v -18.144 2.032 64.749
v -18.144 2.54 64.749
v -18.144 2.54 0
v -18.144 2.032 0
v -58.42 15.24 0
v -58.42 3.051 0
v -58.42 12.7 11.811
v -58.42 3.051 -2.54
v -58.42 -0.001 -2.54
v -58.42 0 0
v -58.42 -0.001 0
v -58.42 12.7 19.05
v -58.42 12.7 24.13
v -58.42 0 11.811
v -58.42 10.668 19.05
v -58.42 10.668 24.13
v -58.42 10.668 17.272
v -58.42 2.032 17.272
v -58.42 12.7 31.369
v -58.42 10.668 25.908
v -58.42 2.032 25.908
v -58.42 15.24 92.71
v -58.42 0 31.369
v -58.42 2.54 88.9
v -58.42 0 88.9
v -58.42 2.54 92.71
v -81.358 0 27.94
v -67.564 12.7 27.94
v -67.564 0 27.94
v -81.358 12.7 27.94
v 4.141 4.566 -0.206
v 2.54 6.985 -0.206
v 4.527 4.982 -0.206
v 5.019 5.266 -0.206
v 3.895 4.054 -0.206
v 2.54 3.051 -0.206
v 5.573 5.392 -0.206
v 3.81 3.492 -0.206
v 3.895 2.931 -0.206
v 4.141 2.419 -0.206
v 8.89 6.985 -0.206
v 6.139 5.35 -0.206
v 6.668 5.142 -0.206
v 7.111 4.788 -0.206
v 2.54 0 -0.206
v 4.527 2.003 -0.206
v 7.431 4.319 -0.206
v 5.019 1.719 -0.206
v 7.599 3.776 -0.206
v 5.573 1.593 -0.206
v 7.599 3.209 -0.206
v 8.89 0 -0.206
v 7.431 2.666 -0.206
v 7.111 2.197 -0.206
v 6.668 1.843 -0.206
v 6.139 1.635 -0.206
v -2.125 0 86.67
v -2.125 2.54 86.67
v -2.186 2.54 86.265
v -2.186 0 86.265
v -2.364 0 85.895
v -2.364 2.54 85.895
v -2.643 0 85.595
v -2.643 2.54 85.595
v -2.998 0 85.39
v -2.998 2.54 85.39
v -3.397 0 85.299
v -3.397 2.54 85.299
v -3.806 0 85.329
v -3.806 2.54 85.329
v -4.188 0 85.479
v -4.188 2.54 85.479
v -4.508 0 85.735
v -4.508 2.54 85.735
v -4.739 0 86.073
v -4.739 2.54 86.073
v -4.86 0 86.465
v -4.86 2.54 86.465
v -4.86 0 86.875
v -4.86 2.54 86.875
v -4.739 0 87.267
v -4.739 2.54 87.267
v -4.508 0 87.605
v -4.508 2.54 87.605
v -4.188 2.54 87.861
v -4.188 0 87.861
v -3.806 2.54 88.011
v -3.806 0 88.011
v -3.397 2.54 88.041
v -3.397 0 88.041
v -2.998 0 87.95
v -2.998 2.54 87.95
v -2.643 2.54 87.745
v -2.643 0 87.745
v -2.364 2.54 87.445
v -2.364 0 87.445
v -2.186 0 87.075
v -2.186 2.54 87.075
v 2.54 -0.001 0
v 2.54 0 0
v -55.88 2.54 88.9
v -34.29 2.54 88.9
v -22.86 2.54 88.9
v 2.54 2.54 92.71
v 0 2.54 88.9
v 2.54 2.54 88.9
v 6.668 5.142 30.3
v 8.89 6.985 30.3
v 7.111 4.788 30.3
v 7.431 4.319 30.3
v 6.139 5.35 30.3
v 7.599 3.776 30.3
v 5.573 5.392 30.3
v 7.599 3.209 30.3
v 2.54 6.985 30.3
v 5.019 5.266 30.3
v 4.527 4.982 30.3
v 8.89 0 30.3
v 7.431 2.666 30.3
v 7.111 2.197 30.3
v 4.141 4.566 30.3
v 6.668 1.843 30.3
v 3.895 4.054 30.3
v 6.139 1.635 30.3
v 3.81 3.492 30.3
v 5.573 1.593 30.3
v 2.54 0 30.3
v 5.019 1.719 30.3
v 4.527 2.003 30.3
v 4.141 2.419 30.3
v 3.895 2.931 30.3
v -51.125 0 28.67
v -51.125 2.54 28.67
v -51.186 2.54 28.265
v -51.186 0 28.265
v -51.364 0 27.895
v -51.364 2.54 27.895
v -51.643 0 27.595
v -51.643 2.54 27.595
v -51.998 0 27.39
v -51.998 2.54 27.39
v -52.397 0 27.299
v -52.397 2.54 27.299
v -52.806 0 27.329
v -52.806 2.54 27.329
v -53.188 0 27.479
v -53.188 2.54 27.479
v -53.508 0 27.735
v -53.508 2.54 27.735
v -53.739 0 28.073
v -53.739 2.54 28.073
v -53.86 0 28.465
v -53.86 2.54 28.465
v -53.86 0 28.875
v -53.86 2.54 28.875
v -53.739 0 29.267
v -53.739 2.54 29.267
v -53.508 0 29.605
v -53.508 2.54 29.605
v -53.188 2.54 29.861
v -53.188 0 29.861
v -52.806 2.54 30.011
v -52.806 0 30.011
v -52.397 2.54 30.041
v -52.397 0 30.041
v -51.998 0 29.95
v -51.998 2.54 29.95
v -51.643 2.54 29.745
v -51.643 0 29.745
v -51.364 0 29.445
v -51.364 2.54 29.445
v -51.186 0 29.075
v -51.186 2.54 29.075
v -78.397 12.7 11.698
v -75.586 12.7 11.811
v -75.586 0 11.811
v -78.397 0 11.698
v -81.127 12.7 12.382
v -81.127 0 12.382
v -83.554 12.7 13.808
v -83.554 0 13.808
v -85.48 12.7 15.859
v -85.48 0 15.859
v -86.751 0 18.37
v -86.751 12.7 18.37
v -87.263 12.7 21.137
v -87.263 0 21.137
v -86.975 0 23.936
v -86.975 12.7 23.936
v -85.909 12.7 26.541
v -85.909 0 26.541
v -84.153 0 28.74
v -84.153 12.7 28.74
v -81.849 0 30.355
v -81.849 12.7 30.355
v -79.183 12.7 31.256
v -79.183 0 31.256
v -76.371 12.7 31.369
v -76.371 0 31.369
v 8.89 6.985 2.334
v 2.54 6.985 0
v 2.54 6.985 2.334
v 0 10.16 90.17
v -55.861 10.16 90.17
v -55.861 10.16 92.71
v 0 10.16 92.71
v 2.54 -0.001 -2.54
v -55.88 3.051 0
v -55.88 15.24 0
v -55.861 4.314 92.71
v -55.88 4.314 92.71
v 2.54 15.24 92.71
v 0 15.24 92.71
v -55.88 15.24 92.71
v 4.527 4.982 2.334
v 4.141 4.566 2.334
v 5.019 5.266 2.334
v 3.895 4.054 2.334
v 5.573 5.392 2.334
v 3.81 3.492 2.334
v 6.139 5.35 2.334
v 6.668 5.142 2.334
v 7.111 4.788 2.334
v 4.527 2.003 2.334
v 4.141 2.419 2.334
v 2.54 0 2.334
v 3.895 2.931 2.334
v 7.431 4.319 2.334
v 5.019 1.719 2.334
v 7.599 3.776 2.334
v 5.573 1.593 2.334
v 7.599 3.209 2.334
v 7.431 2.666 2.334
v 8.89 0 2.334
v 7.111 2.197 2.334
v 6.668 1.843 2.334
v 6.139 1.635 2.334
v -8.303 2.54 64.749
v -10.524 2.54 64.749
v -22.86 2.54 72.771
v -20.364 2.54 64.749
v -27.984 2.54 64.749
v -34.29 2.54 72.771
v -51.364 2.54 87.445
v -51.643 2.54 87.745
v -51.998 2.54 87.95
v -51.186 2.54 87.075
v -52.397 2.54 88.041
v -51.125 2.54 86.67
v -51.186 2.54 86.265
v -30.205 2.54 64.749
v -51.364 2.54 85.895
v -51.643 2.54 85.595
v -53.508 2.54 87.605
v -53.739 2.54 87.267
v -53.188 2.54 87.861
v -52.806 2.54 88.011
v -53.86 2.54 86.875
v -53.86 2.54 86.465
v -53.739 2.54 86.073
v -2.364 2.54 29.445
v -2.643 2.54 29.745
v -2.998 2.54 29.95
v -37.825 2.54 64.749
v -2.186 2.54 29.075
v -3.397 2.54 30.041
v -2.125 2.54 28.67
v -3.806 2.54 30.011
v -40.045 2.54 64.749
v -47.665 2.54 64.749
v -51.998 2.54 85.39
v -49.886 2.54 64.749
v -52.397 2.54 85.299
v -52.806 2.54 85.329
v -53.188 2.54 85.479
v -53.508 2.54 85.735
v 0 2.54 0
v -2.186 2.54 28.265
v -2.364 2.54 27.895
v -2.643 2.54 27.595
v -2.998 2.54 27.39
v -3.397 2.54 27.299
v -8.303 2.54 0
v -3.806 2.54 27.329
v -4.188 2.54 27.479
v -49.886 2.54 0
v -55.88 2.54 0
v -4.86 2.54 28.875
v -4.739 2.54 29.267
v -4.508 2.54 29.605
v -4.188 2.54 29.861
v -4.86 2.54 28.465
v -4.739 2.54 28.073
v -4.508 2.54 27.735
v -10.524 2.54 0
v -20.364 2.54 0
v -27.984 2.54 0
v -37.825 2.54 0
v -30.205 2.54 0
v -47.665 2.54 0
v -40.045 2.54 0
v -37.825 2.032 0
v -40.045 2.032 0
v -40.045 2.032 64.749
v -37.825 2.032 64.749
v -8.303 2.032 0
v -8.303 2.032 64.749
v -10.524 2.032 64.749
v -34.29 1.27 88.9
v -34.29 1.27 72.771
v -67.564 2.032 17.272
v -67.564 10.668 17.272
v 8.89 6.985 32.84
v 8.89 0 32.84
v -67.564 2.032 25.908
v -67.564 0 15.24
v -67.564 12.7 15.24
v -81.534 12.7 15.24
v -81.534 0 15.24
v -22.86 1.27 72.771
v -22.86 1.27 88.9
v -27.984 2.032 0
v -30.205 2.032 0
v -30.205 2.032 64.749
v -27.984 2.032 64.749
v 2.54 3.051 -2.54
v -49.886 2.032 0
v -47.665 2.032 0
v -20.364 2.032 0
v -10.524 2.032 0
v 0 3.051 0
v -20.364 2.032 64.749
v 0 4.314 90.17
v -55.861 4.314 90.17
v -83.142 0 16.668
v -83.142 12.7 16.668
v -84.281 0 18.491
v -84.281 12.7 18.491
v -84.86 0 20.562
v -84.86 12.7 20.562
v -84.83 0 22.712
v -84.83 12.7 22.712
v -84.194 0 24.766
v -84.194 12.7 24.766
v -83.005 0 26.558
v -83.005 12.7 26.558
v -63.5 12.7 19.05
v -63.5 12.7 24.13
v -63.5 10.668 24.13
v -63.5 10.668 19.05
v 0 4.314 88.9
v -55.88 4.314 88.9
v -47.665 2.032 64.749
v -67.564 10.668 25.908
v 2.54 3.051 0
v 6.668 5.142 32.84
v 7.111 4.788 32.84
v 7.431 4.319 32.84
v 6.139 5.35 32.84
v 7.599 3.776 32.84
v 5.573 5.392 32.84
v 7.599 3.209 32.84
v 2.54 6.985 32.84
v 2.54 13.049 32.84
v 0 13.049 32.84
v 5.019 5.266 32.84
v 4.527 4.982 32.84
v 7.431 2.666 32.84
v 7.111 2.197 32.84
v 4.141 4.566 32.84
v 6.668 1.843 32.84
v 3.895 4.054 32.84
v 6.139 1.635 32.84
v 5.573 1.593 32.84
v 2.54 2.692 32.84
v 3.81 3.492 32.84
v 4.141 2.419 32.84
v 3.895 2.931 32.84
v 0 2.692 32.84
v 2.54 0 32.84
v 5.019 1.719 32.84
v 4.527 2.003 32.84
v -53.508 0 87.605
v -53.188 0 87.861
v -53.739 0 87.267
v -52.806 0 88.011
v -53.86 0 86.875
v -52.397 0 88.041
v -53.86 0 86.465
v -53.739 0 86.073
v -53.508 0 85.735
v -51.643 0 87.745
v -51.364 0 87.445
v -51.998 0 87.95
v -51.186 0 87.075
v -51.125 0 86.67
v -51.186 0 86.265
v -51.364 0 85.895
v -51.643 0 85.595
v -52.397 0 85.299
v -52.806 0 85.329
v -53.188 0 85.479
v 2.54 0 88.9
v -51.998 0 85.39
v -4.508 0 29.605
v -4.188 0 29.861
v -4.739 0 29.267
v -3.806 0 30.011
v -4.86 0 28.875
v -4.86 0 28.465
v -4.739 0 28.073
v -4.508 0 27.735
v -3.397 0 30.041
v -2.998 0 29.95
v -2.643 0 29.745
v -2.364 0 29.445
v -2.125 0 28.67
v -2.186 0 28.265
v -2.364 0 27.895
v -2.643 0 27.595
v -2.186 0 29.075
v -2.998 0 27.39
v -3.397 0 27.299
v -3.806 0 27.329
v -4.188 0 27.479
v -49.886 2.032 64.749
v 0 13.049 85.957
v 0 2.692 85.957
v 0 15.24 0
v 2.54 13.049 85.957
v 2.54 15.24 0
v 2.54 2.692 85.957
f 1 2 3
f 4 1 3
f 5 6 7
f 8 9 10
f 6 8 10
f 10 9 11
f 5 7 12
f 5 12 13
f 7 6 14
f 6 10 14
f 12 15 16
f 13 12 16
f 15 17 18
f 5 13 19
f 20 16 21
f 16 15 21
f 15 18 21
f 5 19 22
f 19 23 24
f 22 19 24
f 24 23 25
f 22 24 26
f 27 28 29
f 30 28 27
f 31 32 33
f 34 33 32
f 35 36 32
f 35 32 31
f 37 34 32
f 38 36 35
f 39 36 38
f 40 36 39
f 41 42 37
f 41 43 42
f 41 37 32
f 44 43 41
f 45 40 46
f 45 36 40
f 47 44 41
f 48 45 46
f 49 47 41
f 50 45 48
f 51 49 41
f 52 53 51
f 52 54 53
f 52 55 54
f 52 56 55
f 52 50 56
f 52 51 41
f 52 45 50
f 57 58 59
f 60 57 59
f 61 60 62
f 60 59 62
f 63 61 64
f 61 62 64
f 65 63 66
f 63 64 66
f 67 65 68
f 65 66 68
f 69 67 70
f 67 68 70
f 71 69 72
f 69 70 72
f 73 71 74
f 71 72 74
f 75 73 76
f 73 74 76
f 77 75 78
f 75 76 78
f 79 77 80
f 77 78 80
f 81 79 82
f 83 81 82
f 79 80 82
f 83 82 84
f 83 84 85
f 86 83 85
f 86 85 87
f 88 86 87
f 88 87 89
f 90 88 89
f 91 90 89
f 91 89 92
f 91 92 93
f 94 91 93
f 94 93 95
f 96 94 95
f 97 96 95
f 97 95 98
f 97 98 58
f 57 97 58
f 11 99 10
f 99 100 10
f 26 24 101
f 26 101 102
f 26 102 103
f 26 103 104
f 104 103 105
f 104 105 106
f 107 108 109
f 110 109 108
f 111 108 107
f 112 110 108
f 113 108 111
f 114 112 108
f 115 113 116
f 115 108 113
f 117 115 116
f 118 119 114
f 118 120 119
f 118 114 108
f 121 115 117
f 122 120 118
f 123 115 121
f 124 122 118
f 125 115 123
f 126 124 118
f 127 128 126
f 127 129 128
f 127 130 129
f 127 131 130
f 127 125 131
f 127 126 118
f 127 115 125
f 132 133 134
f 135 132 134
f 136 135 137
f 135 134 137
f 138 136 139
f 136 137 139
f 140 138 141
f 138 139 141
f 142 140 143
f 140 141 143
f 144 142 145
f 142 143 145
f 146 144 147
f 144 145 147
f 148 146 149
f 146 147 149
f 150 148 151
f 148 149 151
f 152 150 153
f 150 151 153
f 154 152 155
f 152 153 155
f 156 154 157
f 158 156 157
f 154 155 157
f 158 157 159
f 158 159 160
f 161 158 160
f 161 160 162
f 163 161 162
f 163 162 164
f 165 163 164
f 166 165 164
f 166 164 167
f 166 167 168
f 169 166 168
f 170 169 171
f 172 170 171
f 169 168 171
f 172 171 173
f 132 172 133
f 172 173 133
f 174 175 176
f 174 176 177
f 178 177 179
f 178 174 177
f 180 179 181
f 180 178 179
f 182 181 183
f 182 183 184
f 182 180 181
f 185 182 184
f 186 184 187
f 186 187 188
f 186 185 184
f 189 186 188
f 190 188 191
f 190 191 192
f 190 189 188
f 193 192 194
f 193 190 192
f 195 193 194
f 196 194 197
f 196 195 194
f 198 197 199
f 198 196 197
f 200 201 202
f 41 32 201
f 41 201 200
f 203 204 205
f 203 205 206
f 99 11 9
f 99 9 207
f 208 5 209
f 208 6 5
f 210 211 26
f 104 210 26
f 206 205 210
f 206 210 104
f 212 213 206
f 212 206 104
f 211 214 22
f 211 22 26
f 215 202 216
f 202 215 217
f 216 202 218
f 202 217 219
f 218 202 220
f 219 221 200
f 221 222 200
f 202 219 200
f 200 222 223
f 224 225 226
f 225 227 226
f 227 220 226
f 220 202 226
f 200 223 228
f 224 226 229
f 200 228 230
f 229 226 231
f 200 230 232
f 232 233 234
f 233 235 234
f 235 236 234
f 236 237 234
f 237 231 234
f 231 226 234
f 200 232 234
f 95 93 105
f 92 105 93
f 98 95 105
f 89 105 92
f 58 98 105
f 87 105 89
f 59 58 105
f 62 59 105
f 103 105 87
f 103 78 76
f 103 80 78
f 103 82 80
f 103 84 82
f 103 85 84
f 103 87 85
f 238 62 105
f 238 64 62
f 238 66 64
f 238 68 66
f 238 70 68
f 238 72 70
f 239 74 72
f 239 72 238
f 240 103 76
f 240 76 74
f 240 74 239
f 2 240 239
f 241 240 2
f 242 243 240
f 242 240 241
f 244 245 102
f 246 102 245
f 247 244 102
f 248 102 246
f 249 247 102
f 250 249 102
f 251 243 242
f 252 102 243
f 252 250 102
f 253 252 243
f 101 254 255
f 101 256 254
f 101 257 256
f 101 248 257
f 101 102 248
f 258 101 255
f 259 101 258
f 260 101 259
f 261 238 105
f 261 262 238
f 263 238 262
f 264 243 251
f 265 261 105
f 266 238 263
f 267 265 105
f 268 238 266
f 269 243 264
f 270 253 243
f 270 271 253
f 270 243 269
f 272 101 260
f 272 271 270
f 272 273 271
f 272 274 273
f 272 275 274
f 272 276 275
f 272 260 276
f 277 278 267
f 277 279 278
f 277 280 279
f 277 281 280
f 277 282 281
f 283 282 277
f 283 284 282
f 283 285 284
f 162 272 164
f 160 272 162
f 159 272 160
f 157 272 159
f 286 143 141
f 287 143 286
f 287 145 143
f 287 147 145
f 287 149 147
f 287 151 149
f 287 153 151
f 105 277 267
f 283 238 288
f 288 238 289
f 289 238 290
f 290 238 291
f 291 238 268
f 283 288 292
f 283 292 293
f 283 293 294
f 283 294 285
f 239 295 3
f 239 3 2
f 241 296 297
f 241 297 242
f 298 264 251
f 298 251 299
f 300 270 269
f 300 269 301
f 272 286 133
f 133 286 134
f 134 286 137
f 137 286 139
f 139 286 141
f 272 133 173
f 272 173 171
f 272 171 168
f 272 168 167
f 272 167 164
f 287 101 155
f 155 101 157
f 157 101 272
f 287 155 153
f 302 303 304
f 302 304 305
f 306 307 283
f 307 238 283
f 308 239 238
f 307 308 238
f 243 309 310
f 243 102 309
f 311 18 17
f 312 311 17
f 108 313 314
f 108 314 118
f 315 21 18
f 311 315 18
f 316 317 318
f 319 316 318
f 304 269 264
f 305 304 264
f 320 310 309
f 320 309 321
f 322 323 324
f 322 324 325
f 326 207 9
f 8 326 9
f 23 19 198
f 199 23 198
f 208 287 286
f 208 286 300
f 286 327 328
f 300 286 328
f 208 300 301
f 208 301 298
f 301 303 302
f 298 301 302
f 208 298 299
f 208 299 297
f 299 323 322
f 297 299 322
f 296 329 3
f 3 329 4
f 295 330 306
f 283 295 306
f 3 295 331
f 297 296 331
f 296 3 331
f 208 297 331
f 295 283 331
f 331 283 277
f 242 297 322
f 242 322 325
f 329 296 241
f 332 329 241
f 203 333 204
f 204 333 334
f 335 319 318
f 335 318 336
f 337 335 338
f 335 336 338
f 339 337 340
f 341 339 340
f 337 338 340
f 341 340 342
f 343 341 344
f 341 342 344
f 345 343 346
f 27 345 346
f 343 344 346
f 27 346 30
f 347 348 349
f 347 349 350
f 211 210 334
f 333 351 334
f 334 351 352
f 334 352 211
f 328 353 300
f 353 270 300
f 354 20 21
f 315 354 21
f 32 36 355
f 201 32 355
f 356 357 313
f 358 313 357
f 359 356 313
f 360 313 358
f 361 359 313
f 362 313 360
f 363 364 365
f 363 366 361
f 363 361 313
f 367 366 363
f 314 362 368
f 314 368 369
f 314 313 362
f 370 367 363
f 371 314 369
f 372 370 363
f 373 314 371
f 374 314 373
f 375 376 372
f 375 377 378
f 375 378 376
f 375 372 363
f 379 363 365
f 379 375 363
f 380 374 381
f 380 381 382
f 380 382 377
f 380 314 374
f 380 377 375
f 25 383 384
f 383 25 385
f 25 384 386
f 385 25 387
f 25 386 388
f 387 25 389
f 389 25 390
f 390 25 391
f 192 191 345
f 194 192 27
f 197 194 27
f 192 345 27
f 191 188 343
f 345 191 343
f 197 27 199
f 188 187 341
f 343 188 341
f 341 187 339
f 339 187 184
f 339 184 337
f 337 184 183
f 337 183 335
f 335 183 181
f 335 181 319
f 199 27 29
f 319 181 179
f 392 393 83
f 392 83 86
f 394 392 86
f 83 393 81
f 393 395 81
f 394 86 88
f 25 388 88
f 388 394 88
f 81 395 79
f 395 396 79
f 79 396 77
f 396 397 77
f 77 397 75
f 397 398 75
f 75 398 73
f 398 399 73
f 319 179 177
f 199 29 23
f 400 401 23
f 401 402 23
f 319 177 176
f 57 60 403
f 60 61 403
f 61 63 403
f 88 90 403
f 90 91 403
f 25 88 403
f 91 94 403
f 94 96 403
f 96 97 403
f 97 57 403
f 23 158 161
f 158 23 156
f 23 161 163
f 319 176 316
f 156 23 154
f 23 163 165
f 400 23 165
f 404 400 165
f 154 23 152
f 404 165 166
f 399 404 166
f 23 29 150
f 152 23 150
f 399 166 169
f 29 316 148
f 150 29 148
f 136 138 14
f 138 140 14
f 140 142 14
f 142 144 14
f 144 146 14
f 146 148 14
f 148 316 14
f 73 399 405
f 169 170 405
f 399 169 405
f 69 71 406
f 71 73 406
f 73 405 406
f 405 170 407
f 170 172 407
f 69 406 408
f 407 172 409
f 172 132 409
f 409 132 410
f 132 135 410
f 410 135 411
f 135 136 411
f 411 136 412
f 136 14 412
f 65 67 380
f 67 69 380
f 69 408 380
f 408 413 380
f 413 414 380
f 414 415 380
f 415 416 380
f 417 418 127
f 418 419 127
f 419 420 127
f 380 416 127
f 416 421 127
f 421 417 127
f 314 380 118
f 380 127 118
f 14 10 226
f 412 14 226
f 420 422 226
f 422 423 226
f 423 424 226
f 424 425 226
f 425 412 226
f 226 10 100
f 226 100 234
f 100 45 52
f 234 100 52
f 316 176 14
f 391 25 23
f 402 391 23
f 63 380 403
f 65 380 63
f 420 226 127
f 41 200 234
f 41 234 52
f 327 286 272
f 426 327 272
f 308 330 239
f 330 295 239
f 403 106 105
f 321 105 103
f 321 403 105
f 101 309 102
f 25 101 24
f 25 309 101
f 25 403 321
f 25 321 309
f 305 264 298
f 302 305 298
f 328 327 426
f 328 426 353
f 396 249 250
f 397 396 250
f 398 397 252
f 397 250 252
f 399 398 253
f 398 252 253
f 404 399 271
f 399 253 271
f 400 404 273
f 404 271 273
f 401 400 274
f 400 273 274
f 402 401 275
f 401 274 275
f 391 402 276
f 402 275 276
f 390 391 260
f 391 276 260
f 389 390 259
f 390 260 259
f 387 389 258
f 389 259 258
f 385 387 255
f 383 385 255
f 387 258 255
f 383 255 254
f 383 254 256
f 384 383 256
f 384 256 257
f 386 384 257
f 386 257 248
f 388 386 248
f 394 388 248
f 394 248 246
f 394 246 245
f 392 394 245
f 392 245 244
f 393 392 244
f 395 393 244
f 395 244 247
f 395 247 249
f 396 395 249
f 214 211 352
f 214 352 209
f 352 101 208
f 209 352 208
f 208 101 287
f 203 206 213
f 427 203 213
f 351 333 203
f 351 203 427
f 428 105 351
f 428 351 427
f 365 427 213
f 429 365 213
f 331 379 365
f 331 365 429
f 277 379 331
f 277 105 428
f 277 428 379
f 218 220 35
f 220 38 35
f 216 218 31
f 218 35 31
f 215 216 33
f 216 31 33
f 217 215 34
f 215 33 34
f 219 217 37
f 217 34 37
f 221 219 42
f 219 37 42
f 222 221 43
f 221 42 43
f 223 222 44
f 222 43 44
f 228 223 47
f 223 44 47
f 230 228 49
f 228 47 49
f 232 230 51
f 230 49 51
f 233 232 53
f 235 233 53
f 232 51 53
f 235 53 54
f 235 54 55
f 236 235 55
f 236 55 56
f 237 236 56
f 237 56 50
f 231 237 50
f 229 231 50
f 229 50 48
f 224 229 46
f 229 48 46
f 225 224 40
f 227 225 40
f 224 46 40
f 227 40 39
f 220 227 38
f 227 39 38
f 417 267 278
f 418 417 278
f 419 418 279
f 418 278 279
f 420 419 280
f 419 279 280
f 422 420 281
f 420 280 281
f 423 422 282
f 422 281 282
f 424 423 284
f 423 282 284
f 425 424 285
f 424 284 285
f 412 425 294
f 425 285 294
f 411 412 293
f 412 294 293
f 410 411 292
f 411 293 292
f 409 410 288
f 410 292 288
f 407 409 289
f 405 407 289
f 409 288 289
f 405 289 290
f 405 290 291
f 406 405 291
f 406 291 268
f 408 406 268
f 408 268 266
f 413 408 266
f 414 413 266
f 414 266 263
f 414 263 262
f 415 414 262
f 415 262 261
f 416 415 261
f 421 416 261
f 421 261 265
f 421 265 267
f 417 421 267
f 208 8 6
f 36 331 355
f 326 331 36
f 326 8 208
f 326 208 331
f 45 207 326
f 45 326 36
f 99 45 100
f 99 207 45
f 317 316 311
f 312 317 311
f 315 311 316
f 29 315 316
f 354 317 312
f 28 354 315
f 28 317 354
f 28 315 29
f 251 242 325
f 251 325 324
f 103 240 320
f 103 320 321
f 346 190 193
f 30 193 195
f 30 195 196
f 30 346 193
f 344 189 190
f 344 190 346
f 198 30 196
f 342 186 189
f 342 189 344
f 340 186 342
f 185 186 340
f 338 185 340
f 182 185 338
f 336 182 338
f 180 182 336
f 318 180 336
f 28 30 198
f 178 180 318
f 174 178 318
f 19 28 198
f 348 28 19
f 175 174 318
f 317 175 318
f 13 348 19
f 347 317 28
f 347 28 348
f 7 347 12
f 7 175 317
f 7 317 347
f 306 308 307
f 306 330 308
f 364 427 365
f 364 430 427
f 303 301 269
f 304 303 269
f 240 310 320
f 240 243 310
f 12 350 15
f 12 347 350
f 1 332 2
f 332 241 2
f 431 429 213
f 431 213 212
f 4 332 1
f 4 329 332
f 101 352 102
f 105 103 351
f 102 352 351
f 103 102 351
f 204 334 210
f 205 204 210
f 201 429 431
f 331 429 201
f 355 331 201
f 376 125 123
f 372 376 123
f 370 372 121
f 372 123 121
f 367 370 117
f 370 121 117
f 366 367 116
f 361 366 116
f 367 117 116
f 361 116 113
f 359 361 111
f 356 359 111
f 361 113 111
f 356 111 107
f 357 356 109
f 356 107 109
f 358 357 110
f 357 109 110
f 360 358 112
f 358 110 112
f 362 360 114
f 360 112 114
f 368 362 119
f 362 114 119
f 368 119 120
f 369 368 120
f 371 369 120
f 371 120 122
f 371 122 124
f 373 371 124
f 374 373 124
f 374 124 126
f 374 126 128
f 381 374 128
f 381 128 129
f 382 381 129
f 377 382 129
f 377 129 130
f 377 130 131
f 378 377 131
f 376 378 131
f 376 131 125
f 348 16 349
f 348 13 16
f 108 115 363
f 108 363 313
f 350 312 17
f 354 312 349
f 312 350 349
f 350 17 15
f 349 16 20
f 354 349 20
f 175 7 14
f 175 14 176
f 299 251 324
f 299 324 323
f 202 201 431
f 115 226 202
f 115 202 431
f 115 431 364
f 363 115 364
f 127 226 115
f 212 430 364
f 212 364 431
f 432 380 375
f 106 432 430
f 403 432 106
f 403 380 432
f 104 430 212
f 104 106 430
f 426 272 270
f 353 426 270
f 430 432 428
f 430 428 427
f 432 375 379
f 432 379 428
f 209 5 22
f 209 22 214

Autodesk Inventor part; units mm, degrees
ref_plane "YZ Plane" through (0, 0, 0) normal (1, 0, 0) x (0, 1, 0)
ref_plane "XZ Plane" through (0, 0, 0) normal (0, 1, 0) x (-1, 0, 0)
ref_plane "XY Plane" through (0, 0, 0) normal (0, 0, 1) x (1, 0, 0)
sketch "Sketch1" plane through (0, 0, 0) normal (0, 1, 0) x (-1, 0, 0)
  line L0 (0, 0) -> (55.88, 0)
  line L1 (55.88, 0) -> (55.88, 88.9)
  line L2 (55.88, 88.9) -> (0, 88.9)
  line L3 (0, 88.9) -> (0, 0)
  dimension "d0" = 55.88
  dimension "d1" = 88.9
extrude "Extrusion1" add sketch "Sketch1" along normal blind 2.54
sketch "Sketch2" plane through (0, 2.54, 0) normal (0, 1, 0) x (1, 0, 0)
  line L0 (-55.88, -88.9) -> (0, -88.9) projected
  line L1 (-22.86, -88.9) -> (-34.29, -88.9)
  line L2 (-34.29, -88.9) -> (-34.29, -72.771)
  line L3 (-34.29, -72.771) -> (-22.86, -72.771)
  line L4 (-22.86, -72.771) -> (-22.86, -88.9)
  point P0 (0, 0)
  dimension "d4" = 11.43
  dimension "d5" = 16.129
  dimension "d6" = 21.59
  dimension "d7" = 22.86
extrude "Extrusion2" cut sketch "Sketch2" against normal blind 1.27
sketch "Sketch3" plane through (0, 2.54, 0) normal (0, 1, 0) x (1, 0, 0)
  line L0 (-10.5239, -64.7488) -> (-8.3034, -64.7488)
  line L1 (-8.3034, -64.7488) -> (-8.3034, 0)
  line L2 (-8.3034, 0) -> (-10.5239, 0)
  line L3 (-10.5239, 0) -> (-10.5239, -64.7488)
  line L4 (0, 0) -> (-55.88, 0) projected
  line L5 (-27.9843, -64.7488) -> (-30.2048, -64.7488)
  line L6 (-30.2048, -64.7488) -> (-30.2048, 0)
  line L7 (-30.2048, 0) -> (-27.9843, 0)
  line L8 (-27.9843, 0) -> (-27.9843, -64.7488)
  line L9 (-49.8857, -64.7488) -> (-47.6652, -64.7488)
  line L10 (-47.6652, -64.7488) -> (-47.6652, 0)
  line L11 (-47.6652, 0) -> (-49.8857, 0)
  line L12 (-49.8857, 0) -> (-49.8857, -64.7488)
  line L13 (-40.0452, -64.7488) -> (-37.8248, -64.7488)
  line L14 (-37.8248, -64.7488) -> (-37.8248, 0)
  line L15 (-37.8248, 0) -> (-40.0452, 0)
  line L16 (-40.0452, 0) -> (-40.0452, -64.7488)
  line L17 (-20.3643, -64.7488) -> (-18.1439, -64.7488)
  line L18 (-18.1439, -64.7488) -> (-18.1439, 0)
  line L19 (-18.1439, 0) -> (-20.3643, 0)
  line L20 (-20.3643, 0) -> (-20.3643, -64.7488)
  line L21 (-47.6652, -64.7488) -> (-40.0452, -64.7488)
  line L22 (-34.29, -72.771) -> (-22.86, -72.771) projected
  line L23 (-37.8248, -64.7488) -> (-30.2048, -64.7488)
  line L24 (-27.9843, -64.7488) -> (-20.3643, -64.7488)
  line L25 (-18.1439, -64.7488) -> (-10.5239, -64.7488)
  dimension "d10" = 7.62
extrude "Extrusion3" cut sketch "Sketch3" against normal blind 0.508 contours L3 L2 L1 L0 | L17 L20 L4 L18 | L5 L6 L4 L8 | L13 L16 L4 L14 | L9 L12 L4 L10
sketch "Sketch4" plane through (-55.88, 0, 0) normal (-1, 0, 0) x (0, 0, 1)
  line L0 (88.9, 0) -> (0, 0) projected
  line L1 (88.9, 0) -> (0, 0)
  line L2 (0, 0) -> (0, 2.54)
  line L3 (0, 2.54) -> (88.9, 2.54)
  line L4 (88.9, 2.54) -> (88.9, 0)
extrude "Extrusion4" add sketch "Sketch4" along normal blind 2.54
sketch "Sketch5" plane through (0, 2.54, 0) normal (0, 1, 0) x (1, 0, 0)
  line L0 (0, -88.9) -> (-58.42, -88.9) projected
  line L1 (-49.8857, 0) -> (-58.42, 0) projected
  line L2 (-58.42, -88.9) -> (-55.88, -88.9)
  line L3 (-55.88, -88.9) -> (-55.88, 0)
  line L4 (-55.88, 0) -> (-58.42, 0)
  line L5 (-58.42, 0) -> (-58.42, -88.9)
  point P0 (0, 0)
  dimension "d15" = 2.54
extrude "Extrusion5" add sketch "Sketch5" along normal blind 12.7
sketch "Sketch6" plane through (0, 0, 88.9) normal (1, 0, 0) x (0, 0, -1)
  line L0 (0, 2.54) -> (16.129, 2.54) projected
  line L1 (0, 0) -> (88.9, 0) projected
  line L2 (0, 2.54) -> (88.9, 2.54)
  line L3 (88.9, 2.54) -> (88.9, 0)
  line L4 (88.9, 0) -> (0, 0)
  line L5 (0, 0) -> (0, 2.54)
extrude "Extrusion6" add sketch "Sketch6" along normal blind 2.54
sketch "Sketch7" plane through (0, 2.54, 0) normal (0, 1, 0) x (1, 0, 0)
  line L0 (2.54, 0) -> (2.54, -88.9) projected
  line L1 (2.54, -88.9) -> (0, -88.9)
  line L2 (0, -88.9) -> (0, 0)
  line L3 (0, 0) -> (2.54, 0)
  line L4 (2.54, 0) -> (2.54, -88.9)
extrude "Extrusion7" add sketch "Sketch7" along normal blind 12.7
sketch "Sketch8" plane through (-34.29, 1.27, 88.9) normal (0, 0, 1) x (1, 0, 0)
  line L0 (-24.13, -1.27) -> (-24.13, 13.97) projected
  line L1 (-21.59, 1.27) -> (-21.59, 13.97) projected
  line L2 (-24.13, 13.97) -> (-21.59, 13.97)
  line L3 (-21.59, 13.97) -> (-21.59, 1.27)
  line L4 (-21.59, 1.27) -> (-24.13, 1.27)
  line L5 (-24.13, 1.27) -> (-24.13, 13.97)
  line L6 (-24.13, 1.27) -> (36.83, 1.27)
  line L7 (36.83, 1.27) -> (36.83, 3.0441)
  line L8 (36.83, 3.0441) -> (-24.13, 3.0441)
  line L9 (-24.13, 3.0441) -> (-24.13, 1.27)
  line L10 (36.83, -1.27) -> (36.83, 13.97) projected
  line L11 (34.29, 1.27) -> (36.83, 1.27)
  line L12 (36.83, 1.27) -> (36.83, 13.97)
  line L13 (36.83, 13.97) -> (34.29, 13.97)
  line L14 (34.29, 13.97) -> (34.29, 1.27)
  line L15 (13.9257, 1.27) -> (6.3057, 1.27) projected
  line L16 (11.43, 0) -> (0, 0) projected
  line L17 (11.3074, 1.27) -> (0, 1.27)
  line L18 (0, 1.27) -> (0, 0)
  line L19 (0, 0) -> (11.3074, 0)
  line L20 (11.3074, 0) -> (11.3074, 1.27)
  point P0 (34.29, -1.27)
extrude "Extrusion8" add sketch "Sketch8" along normal blind 3.81 contours L0 L8 L1 L4 | L0 L2 L1 L8 | L1 L8 L14 L6 | L14 L13 L10 L8 | L8 L7 L6 L14
sketch "Sketch9" plane through (0, 2.54, 0) normal (0, 1, 0) x (1, 0, 0)
  line L0 (0, -92.71) -> (-55.88, -92.71) projected
  line L1 (-55.8607, -92.71) -> (0, -92.71)
  line L2 (0, -92.71) -> (0, -90.17)
  line L3 (0, -90.17) -> (-55.8607, -90.17)
  line L4 (-55.8607, -90.17) -> (-55.8607, -92.71)
  point P0 (0, 0)
  point P1 (-58.42, -92.71)
  point P2 (2.54, -92.71)
  dimension "d24" = 2.54
extrude "Extrusion9" add sketch "Sketch9" along normal blind 7.62
sketch "Sketch10" plane through (-20.3643, 2.54, 0) normal (0, 0, -1) x (-1, 0, 0)
  line L0 (-22.9043, 0) -> (-22.9043, 12.7) projected
  line L1 (38.0557, -2.54) -> (38.0557, 12.7) projected
  line L2 (-22.9043, -3.3059) -> (38.0557, -3.3059)
  line L3 (38.0557, -3.3059) -> (38.0557, -0.2509)
  line L4 (38.0557, -0.2509) -> (-22.9043, -0.2509)
  line L5 (-22.9043, -0.2509) -> (-22.9043, -3.3059)
  point P0 (-20.3643, -2.54)
extrude "Extrusion10" add sketch "Sketch10" along normal blind 2.54
sketch "Sketch11" plane through (-49.8857, 2.2891, 0) normal (0, 1, 0) x (1, 0, 0)
  line L0 (52.4257, 2.54) -> (-8.5343, 2.54) projected
  line L1 (-8.5343, 0) -> (52.4257, 0)
  line L2 (52.4257, 0) -> (52.4257, 2.54)
  line L3 (52.4257, 2.54) -> (-8.5343, 2.54)
  line L4 (-8.5343, 2.54) -> (-8.5343, 0)
  point P0 (49.8857, 0)
extrude "Extrusion12" add sketch "Sketch11" along normal blind 0.762
sketch "Sketch13" plane through (2.54, 0, 88.9) normal (1, 0, 0) x (0, 0, -1)
  line L0 (6.1993, 10.8195) -> (74.4262, 10.8195)
  line L1 (74.4262, 10.8195) -> (74.4262, 2.6915)
  line L2 (74.4262, 2.6915) -> (6.1993, 2.6915)
  line L3 (6.1993, 2.6915) -> (6.1993, 10.8195)
  line L4 (0, 2.54) -> (-3.81, 2.54) projected
  line L5 (0, 2.54) -> (0, 4.3141) projected
  point P0 (88.9, 0)
  dimension "d35" = 8.128
  dimension "d37" = 6.1993
extrude "Extrusion13" cut sketch "Sketch13" against normal blind 2.54
sketch "Sketch19" plane through (2.54, 2.6915, 82.7007) normal (0, 1, 0) x (1, 0, 0)
  line L0 (-2.54, -6.1993) -> (-2.54, 82.7007) projected
  line L1 (0, 68.2269) -> (0, 0) projected
  line L2 (-2.54, 68.7335) -> (0, 68.7335)
  line L3 (0, 68.7335) -> (0, 53.3001)
  line L4 (0, 53.3001) -> (-2.54, 53.3001)
  line L5 (-2.54, 53.3001) -> (-2.54, 68.7335)
extrude "Extrusion19" add sketch "Sketch19" along normal blind 10.16
sketch "Sketch20" plane through (2.54, 0, 88.9) normal (1, 0, 0) x (0, 0, -1)
  line L0 (56.0605, 2.54) -> (58.6005, 2.54)
  line L1 (58.6005, 2.54) -> (58.6005, 0)
  line L2 (58.6005, 0) -> (56.0605, 0)
  line L3 (56.0605, 0) -> (56.0605, 2.54)
  line L4 (88.9, 0) -> (0, 0) projected
  line L5 (89.1059, 2.54) -> (86.5659, 2.54)
  line L6 (86.5659, 2.54) -> (86.5659, 0)
  line L7 (86.5659, 0) -> (89.1059, 0)
  line L8 (89.1059, 0) -> (89.1059, 2.54)
  line L9 (0, 2.54) -> (88.9, 2.54) projected
  point P0 (57.3305, 0)
  dimension "d61" = 2.54
  dimension "d69" = 27.9654
extrude "Extrusion20" add sketch "Sketch20" along normal blind 5.08 contours L0 L1 L2 L3 | L5 L8 L7 L4 L6
sketch "Sketch21" plane through (2.54, 2.54, 32.8395) normal (0, 1, 0) x (1, 0, 0)
  line L0 (0, 2.54) -> (5.08, 2.54) projected
  line L1 (0, 0) -> (5.08, 0)
  line L2 (5.08, 0) -> (5.08, 2.54)
  line L3 (5.08, 2.54) -> (0, 2.54)
  line L4 (0, 2.54) -> (0, 0)
  line L5 (0, 33.0454) -> (5.08, 33.0454) projected
  line L6 (0, 30.5054) -> (5.08, 30.5054)
  line L7 (5.08, 30.5054) -> (5.08, 33.0454)
  line L8 (5.08, 33.0454) -> (0, 33.0454)
  line L9 (0, 33.0454) -> (0, 30.5054)
  point P0 (-2.54, 32.8395)
extrude "Extrusion21" add sketch "Sketch21" along normal blind 2.54
sketch "Sketch23" plane through (-58.42, 0, 0) normal (-1, 0, 0) x (0, 0, 1)
  line L0 (17.272, 10.668) -> (25.908, 10.668)
  line L1 (25.908, 10.668) -> (25.908, 2.032)
  line L2 (25.908, 2.032) -> (17.272, 2.032)
  line L3 (17.272, 2.032) -> (17.272, 10.668)
  line L4 (0, 3.0511) -> (0, 15.24) projected
  line L5 (15.24, 12.7) -> (27.94, 12.7)
  line L6 (27.94, 12.7) -> (27.94, 0)
  line L7 (27.94, 0) -> (15.24, 0)
  line L8 (15.24, 0) -> (15.24, 12.7)
  line L9 (0, 0) -> (88.9, 0) projected
  dimension "d70" = 8.636
  dimension "d71" = 8.636
  dimension "d73" = 2.032
  dimension "d74" = 12.7
  dimension "d75" = 12.7
  dimension "d76" = 2.032
  dimension "d77" = 15.24
extrude "Extrusion23" add sketch "Sketch23" along normal blind 9.144
sketch "Sketch24" plane through (-58.42, 12.7, 27.94) normal (0, 1, 0) x (1, 0, 0)
  arc A0 (-17.1656, 16.129) -> (-17.9509, -3.429) centre (-18.9636, 6.4064) ccw
  arc A1 (-23.114, 12.7) -> (-22.9376, 0) centre (-18.9636, 6.4064) ccw
  line L0 (0, 12.7) -> (-9.144, 12.7) projected
  line L1 (0, -3.429) -> (-17.9509, -3.429)
  line L2 (0, 16.129) -> (-17.1656, 16.129)
  line L3 (0, 12.7) -> (0, 16.129)
  line L4 (0, 0) -> (0, -3.429)
  line L5 (0, 0) -> (0, -3.429)
  line L6 (-9.144, 12.7) -> (-23.114, 12.7)
  line L7 (-9.144, 0) -> (-22.9376, 0)
  line L8 (0, 0) -> (-9.144, 0) projected
  line L9 (-9.144, 0) -> (0, 0)
  line L10 (0, 12.7) -> (-9.144, 12.7) projected
  line L11 (-9.144, 12.7) -> (0, 12.7)
  point P0 (58.42, 27.94)
  point P1 (-9.144, 1.0206)
  dimension "d101" = 3.429
  dimension "d104" = 3.429
  dimension "d105" = 13.97
sketch "Sketch25" plane through (-58.42, 12.7, 27.94) normal (0, 1, 0) x (1, 0, 0)
  line L0 (0, 27.94) -> (0, -64.77) projected
  line L1 (0, 3.81) -> (-5.08, 3.81)
  line L2 (-5.08, 3.81) -> (-5.08, 8.89)
  line L3 (-5.08, 8.89) -> (0, 8.89)
  line L4 (0, 8.89) -> (0, 3.81)
  line L5 (0, 0) -> (-9.144, 0) projected
  line L6 (0, 12.7) -> (-9.144, 12.7) projected
  point P0 (58.42, 27.94)
  point P1 (-18.1573, 0)
  point P2 (-18.1573, 12.7)
  point P3 (-22.9376, 0)
  point P4 (-23.114, 12.7)
  dimension "d84" = 5.08
  dimension "d85" = 5.08
  dimension "d87" = 3.81
extrude "Extrusion25" cut sketch "Sketch25" against normal blind 5.08
sketch "Sketch27" plane through (-58.42, -0.7659, 0) normal (0, -1, 0) x (1, 0, 0)
  line L0 (60.96, -2.54) -> (0, -2.54) projected
  line L1 (2.54, 0) -> (0, 0) projected
  line L2 (60.96, -2.54) -> (0, -2.54)
  line L3 (0, -2.54) -> (0, 0)
  line L4 (0, 0) -> (60.96, 0)
  line L5 (60.96, 0) -> (60.96, -2.54)
  point P0 (58.42, 0)
extrude "Extrusion27" cut sketch "Sketch27" against normal blind 0.7645
sketch "Sketch28" plane through (2.54, 5.08, 32.8395) normal (0, 1, 0) x (1, 0, 0)
  line L0 (0, 2.54) -> (0, 0) projected
  line L1 (5.08, 0) -> (5.08, 2.54) projected
  line L2 (0, 2.54) -> (5.08, 2.54)
  line L3 (5.08, 2.54) -> (5.08, 0)
  line L4 (5.08, 0) -> (0, 0)
  line L5 (0, 0) -> (0, 2.54)
  line L6 (0, 33.0454) -> (0, 35.3795) projected
  line L7 (0, 30.5054) -> (5.08, 30.5054) projected
  line L8 (0, 33.0454) -> (5.08, 33.0454)
  line L9 (5.08, 33.0454) -> (5.08, 30.5054)
  line L10 (5.08, 30.5054) -> (0, 30.5054)
  line L11 (0, 30.5054) -> (0, 33.0454)
  point P0 (-2.54, 32.8395)
extrude "Extrusion28" add sketch "Sketch28" along normal blind 1.905
sketch "Sketch29" plane through (7.62, 0, 88.9) normal (1, 0, 0) x (0, 0, -1)
  line L0 (56.0605, 2.6915) -> (56.0605, 6.985) projected
  line L1 (58.6005, 0) -> (58.6005, 6.985) projected
  line L2 (56.0605, 6.985) -> (58.6005, 6.985)
  line L3 (58.6005, 6.985) -> (58.6005, 0)
  line L4 (58.6005, 0) -> (56.0605, 0)
  line L5 (56.0605, 0) -> (56.0605, 6.985)
  line L6 (86.5659, 0) -> (86.5659, 6.985) projected
  line L7 (89.1059, 0) -> (89.1059, 6.985) projected
  line L8 (86.5659, 6.985) -> (89.1059, 6.985)
  line L9 (89.1059, 6.985) -> (89.1059, 0)
  line L10 (89.1059, 0) -> (86.5659, 0)
  line L11 (86.5659, 0) -> (86.5659, 6.985)
  point P0 (88.9, 0)
extrude "Extrusion29" add sketch "Sketch29" along normal blind 1.27
sketch "Sketch30" plane through (0, 2.6915, 82.7007) normal (0, 1, 0) x (1, 0, 0)
  line L0 (2.54, 49.8612) -> (2.54, 0) projected
  line L1 (0, 53.3465) -> (2.54, 53.3465)
  line L2 (2.54, 53.3465) -> (2.54, 49.8612)
  line L3 (2.54, 49.8612) -> (0, 49.8612)
  line L4 (0, 49.8612) -> (0, 53.3465)
  point P0 (0, 82.7007)
extrude "Extrusion30" add sketch "Sketch30" along normal blind 10.16
extrude "Extrusion31" add sketch "Sketch24" against normal blind 12.7
sketch "Sketch31" plane through (2.54, 0, -0.2059) normal (0, 0, -1) x (-1, 0, 0)
  circle A0 centre (-3.175, 3.4925) radius 1.905
  line L0 (0, 6.985) -> (-6.35, 6.985) projected
  line L1 (-6.35, 0) -> (-6.35, 6.985) projected
  point P0 (2.54, 0)
  point P1 (-3.175, 6.985)
  point P2 (-6.35, 3.4925)
  dimension "d108" = 3.81
extrude "Extrusion32" cut sketch "Sketch31" against normal blind 35.56
sketch "Sketch36" plane through (2.54, 0, 88.9) normal (1, 0, 0) x (0, 0, -1)
  line L0 (6.1993, 10.8195) -> (6.1993, 2.6915) projected
  line L1 (6.1993, 2.6915) -> (2.9426, 2.6915)
  line L2 (2.9426, 2.6915) -> (2.9426, 10.8195)
  line L3 (2.9426, 10.8195) -> (6.1993, 10.8195)
  line L4 (6.1993, 10.8195) -> (6.1993, 2.6915)
  point P0 (88.9, 0)
extrude "Extrusion34" cut sketch "Sketch36" against normal blind 3.175
sketch "Sketch37" plane through (0, 2.54, 0) normal (0, 1, 0) x (1, 0, 0)
  circle A0 centre (-3.5, -28.67) radius 1.375 projected
  circle A1 centre (-52.5, -28.67) radius 1.375 projected
  circle A2 centre (-52.5, -86.67) radius 1.375 projected
  circle A3 centre (-3.5, -86.67) radius 1.375 projected
  point P0 (0, 0)
extrude "Extrusion36" cut sketch "Sketch37" against normal blind 22.225
sketch "Sketch38" plane through (2.54, 0, 88.9) normal (1, 0, 0) x (0, 0, -1)
  line L0 (56.0605, 10.8195) -> (2.9426, 10.8195)
  line L1 (2.9426, 10.8195) -> (2.9426, 13.0489)
  line L2 (2.9426, 13.0489) -> (56.0605, 13.0489)
  line L3 (56.0605, 13.0489) -> (56.0605, 10.8195)
  point P0 (88.9, 0)
extrude "Extrusion37" cut sketch "Sketch38" against normal blind 7.9375
properties part number "PI_Box_FINAL_COPY2"
